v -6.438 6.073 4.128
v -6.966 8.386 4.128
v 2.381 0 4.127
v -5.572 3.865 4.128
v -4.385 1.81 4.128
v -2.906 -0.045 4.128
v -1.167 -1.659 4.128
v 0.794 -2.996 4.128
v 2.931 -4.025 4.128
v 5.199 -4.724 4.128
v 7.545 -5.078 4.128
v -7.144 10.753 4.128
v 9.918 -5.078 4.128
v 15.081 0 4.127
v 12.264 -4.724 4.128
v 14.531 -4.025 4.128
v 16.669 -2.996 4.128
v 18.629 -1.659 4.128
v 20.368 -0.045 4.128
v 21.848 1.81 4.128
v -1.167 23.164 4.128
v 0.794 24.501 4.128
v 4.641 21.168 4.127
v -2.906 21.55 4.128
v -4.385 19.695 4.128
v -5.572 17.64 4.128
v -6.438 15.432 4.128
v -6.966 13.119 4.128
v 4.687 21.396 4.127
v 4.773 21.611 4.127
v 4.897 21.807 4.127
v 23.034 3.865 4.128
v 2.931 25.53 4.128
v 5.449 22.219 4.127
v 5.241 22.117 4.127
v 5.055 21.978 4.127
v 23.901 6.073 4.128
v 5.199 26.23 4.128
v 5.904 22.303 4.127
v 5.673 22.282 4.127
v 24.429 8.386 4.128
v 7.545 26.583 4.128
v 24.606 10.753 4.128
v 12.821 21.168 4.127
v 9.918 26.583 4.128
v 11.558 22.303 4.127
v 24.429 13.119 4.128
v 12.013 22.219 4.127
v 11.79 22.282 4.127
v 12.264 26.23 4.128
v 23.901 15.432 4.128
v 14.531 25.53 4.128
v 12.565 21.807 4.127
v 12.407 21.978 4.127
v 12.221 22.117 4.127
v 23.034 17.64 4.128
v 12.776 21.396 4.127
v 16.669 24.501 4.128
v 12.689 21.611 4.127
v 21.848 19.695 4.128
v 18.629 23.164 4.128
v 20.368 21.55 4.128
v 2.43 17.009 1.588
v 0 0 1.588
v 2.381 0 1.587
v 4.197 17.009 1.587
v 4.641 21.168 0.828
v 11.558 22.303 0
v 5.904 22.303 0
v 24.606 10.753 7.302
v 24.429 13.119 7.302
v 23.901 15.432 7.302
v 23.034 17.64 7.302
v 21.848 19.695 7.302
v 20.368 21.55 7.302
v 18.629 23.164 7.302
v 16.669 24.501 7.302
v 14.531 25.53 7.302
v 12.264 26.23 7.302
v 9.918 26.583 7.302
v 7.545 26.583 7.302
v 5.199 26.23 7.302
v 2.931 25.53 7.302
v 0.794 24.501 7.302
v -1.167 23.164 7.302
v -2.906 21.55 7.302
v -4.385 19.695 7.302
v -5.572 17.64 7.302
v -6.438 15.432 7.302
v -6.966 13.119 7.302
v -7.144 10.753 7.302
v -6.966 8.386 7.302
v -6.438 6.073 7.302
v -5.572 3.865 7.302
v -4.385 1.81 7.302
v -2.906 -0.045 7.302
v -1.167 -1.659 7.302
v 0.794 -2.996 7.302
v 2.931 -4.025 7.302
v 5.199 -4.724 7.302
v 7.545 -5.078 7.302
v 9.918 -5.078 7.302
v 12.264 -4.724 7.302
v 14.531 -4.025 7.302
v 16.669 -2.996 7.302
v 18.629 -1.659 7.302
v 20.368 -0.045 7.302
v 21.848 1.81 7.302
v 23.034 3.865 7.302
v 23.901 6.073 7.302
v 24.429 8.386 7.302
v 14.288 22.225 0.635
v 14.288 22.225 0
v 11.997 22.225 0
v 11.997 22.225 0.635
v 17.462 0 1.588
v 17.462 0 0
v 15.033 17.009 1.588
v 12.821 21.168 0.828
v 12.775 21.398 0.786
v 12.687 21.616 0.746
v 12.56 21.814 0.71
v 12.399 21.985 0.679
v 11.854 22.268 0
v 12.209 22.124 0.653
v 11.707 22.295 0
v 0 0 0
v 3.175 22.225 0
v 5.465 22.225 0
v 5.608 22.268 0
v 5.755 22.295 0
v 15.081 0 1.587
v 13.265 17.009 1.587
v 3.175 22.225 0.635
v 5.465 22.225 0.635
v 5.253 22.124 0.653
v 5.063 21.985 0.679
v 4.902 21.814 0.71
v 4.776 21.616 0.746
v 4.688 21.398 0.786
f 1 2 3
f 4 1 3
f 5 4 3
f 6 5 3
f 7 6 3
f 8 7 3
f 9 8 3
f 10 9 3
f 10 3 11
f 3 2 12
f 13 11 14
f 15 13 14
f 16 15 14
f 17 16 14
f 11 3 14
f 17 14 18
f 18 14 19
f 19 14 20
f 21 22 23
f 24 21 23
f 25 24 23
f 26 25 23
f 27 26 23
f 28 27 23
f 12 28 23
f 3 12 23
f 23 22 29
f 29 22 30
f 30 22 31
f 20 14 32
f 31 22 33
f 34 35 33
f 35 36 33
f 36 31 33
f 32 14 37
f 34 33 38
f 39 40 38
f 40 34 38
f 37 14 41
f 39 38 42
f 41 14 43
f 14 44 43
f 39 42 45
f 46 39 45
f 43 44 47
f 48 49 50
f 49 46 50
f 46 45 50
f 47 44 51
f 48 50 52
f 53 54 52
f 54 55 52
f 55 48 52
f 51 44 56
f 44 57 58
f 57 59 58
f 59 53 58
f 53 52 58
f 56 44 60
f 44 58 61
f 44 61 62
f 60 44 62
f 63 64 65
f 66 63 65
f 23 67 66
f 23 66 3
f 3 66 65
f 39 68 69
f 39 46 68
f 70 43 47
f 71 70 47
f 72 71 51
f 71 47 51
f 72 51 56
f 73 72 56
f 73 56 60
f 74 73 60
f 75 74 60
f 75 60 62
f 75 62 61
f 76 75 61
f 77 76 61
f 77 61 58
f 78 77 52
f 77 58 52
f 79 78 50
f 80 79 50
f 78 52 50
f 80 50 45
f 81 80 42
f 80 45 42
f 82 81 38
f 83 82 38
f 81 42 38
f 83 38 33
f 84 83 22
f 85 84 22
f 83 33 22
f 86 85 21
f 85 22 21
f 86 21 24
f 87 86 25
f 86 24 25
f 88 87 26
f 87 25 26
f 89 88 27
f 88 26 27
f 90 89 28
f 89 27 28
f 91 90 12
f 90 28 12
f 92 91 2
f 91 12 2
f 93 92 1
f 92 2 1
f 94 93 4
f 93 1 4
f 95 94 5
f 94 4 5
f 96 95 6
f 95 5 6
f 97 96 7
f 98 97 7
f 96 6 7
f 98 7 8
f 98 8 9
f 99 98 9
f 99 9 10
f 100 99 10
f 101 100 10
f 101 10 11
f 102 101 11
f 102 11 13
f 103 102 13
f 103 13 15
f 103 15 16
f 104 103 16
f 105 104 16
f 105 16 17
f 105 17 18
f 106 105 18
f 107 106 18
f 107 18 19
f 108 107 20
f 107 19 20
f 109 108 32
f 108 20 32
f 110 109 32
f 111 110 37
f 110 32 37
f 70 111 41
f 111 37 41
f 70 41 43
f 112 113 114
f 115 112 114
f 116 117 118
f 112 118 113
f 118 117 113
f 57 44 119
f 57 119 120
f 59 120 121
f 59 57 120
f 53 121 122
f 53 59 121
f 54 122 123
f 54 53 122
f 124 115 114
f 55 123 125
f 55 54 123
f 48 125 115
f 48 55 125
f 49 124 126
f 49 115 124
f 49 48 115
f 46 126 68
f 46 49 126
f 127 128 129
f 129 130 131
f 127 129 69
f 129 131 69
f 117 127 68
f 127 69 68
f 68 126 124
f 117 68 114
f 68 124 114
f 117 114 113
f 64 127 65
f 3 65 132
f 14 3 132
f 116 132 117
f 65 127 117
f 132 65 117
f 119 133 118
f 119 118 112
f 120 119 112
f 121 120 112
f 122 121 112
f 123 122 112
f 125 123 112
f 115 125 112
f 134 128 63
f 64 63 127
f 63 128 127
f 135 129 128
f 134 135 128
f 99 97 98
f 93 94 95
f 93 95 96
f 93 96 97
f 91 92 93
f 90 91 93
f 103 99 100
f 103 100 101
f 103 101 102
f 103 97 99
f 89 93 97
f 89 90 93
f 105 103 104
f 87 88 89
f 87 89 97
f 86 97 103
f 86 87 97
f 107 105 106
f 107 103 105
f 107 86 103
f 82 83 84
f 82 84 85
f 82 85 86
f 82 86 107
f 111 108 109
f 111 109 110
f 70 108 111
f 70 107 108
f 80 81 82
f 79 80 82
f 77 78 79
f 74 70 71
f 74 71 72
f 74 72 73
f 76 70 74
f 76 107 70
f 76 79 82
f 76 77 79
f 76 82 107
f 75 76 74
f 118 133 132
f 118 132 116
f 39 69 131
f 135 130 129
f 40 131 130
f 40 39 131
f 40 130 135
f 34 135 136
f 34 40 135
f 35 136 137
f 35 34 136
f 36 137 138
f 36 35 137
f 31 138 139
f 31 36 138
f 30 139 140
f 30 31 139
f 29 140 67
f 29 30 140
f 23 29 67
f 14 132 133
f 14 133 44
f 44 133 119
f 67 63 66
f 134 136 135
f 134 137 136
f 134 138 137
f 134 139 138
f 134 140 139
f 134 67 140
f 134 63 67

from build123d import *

# Parameters (mm, degrees)
F1_DEPTH      = 1.5875
F3_DEPTH      = 17.4635
F5_DEPTH      = 2.54
F5_DEPTH_BACK = 1.5875
F6_R          = 15.875
F7_DEPTH      = 3.175


with BuildPart() as f1:
    # F0 (on Top) → F1 (new body)
    with BuildSketch(Plane.XY):
        Polygon((3.175, 22.225), (0, 0), (17.4625, 0), (14.2875, 22.225), (8.73125, 22.225), align=None)
    extrude(amount=F1_DEPTH)

    # F2 (on Right) → F3 (cut, through all)
    with BuildSketch(Plane.YZ):
        Polygon((5.840029, 3.627038), (22.225, 0.635), (22.723673, 7.972618), (5.840029, 7.972618), align=None)
    extrude(amount=F3_DEPTH, mode=Mode.SUBTRACT)

    # F4 (on face) → F5 (join, two sides)
    with BuildSketch(Plane.XY.offset(1.5875)) as f5_sk:
        with BuildLine():
            Line((2.38125, 0), (8.73125, 0))
            Line((8.73125, 0), (15.08125, 0))
            Line((15.08125, 0), (12.821199, 21.168127))
            ThreePointArc((12.821199, 21.168127), (12.407396, 21.977792), (11.558376, 22.3033))
            Line((11.558376, 22.3033), (8.73125, 22.3033))
            Line((8.73125, 22.3033), (5.904124, 22.3033))
            ThreePointArc((5.904124, 22.3033), (5.055104, 21.977792), (4.641301, 21.168127))
            Line((4.641301, 21.168127), (2.38125, 0))
        make_face()
    extrude(amount=F5_DEPTH)
    extrude(f5_sk.sketch, amount=-F5_DEPTH_BACK)

    # F6 (on face) → F7 (join)
    with BuildSketch(Plane.XY.offset(4.1275)):
        with Locations((8.73125, 10.752532)):
            Circle(F6_R)
    extrude(amount=F7_DEPTH)


solid = f1.part
